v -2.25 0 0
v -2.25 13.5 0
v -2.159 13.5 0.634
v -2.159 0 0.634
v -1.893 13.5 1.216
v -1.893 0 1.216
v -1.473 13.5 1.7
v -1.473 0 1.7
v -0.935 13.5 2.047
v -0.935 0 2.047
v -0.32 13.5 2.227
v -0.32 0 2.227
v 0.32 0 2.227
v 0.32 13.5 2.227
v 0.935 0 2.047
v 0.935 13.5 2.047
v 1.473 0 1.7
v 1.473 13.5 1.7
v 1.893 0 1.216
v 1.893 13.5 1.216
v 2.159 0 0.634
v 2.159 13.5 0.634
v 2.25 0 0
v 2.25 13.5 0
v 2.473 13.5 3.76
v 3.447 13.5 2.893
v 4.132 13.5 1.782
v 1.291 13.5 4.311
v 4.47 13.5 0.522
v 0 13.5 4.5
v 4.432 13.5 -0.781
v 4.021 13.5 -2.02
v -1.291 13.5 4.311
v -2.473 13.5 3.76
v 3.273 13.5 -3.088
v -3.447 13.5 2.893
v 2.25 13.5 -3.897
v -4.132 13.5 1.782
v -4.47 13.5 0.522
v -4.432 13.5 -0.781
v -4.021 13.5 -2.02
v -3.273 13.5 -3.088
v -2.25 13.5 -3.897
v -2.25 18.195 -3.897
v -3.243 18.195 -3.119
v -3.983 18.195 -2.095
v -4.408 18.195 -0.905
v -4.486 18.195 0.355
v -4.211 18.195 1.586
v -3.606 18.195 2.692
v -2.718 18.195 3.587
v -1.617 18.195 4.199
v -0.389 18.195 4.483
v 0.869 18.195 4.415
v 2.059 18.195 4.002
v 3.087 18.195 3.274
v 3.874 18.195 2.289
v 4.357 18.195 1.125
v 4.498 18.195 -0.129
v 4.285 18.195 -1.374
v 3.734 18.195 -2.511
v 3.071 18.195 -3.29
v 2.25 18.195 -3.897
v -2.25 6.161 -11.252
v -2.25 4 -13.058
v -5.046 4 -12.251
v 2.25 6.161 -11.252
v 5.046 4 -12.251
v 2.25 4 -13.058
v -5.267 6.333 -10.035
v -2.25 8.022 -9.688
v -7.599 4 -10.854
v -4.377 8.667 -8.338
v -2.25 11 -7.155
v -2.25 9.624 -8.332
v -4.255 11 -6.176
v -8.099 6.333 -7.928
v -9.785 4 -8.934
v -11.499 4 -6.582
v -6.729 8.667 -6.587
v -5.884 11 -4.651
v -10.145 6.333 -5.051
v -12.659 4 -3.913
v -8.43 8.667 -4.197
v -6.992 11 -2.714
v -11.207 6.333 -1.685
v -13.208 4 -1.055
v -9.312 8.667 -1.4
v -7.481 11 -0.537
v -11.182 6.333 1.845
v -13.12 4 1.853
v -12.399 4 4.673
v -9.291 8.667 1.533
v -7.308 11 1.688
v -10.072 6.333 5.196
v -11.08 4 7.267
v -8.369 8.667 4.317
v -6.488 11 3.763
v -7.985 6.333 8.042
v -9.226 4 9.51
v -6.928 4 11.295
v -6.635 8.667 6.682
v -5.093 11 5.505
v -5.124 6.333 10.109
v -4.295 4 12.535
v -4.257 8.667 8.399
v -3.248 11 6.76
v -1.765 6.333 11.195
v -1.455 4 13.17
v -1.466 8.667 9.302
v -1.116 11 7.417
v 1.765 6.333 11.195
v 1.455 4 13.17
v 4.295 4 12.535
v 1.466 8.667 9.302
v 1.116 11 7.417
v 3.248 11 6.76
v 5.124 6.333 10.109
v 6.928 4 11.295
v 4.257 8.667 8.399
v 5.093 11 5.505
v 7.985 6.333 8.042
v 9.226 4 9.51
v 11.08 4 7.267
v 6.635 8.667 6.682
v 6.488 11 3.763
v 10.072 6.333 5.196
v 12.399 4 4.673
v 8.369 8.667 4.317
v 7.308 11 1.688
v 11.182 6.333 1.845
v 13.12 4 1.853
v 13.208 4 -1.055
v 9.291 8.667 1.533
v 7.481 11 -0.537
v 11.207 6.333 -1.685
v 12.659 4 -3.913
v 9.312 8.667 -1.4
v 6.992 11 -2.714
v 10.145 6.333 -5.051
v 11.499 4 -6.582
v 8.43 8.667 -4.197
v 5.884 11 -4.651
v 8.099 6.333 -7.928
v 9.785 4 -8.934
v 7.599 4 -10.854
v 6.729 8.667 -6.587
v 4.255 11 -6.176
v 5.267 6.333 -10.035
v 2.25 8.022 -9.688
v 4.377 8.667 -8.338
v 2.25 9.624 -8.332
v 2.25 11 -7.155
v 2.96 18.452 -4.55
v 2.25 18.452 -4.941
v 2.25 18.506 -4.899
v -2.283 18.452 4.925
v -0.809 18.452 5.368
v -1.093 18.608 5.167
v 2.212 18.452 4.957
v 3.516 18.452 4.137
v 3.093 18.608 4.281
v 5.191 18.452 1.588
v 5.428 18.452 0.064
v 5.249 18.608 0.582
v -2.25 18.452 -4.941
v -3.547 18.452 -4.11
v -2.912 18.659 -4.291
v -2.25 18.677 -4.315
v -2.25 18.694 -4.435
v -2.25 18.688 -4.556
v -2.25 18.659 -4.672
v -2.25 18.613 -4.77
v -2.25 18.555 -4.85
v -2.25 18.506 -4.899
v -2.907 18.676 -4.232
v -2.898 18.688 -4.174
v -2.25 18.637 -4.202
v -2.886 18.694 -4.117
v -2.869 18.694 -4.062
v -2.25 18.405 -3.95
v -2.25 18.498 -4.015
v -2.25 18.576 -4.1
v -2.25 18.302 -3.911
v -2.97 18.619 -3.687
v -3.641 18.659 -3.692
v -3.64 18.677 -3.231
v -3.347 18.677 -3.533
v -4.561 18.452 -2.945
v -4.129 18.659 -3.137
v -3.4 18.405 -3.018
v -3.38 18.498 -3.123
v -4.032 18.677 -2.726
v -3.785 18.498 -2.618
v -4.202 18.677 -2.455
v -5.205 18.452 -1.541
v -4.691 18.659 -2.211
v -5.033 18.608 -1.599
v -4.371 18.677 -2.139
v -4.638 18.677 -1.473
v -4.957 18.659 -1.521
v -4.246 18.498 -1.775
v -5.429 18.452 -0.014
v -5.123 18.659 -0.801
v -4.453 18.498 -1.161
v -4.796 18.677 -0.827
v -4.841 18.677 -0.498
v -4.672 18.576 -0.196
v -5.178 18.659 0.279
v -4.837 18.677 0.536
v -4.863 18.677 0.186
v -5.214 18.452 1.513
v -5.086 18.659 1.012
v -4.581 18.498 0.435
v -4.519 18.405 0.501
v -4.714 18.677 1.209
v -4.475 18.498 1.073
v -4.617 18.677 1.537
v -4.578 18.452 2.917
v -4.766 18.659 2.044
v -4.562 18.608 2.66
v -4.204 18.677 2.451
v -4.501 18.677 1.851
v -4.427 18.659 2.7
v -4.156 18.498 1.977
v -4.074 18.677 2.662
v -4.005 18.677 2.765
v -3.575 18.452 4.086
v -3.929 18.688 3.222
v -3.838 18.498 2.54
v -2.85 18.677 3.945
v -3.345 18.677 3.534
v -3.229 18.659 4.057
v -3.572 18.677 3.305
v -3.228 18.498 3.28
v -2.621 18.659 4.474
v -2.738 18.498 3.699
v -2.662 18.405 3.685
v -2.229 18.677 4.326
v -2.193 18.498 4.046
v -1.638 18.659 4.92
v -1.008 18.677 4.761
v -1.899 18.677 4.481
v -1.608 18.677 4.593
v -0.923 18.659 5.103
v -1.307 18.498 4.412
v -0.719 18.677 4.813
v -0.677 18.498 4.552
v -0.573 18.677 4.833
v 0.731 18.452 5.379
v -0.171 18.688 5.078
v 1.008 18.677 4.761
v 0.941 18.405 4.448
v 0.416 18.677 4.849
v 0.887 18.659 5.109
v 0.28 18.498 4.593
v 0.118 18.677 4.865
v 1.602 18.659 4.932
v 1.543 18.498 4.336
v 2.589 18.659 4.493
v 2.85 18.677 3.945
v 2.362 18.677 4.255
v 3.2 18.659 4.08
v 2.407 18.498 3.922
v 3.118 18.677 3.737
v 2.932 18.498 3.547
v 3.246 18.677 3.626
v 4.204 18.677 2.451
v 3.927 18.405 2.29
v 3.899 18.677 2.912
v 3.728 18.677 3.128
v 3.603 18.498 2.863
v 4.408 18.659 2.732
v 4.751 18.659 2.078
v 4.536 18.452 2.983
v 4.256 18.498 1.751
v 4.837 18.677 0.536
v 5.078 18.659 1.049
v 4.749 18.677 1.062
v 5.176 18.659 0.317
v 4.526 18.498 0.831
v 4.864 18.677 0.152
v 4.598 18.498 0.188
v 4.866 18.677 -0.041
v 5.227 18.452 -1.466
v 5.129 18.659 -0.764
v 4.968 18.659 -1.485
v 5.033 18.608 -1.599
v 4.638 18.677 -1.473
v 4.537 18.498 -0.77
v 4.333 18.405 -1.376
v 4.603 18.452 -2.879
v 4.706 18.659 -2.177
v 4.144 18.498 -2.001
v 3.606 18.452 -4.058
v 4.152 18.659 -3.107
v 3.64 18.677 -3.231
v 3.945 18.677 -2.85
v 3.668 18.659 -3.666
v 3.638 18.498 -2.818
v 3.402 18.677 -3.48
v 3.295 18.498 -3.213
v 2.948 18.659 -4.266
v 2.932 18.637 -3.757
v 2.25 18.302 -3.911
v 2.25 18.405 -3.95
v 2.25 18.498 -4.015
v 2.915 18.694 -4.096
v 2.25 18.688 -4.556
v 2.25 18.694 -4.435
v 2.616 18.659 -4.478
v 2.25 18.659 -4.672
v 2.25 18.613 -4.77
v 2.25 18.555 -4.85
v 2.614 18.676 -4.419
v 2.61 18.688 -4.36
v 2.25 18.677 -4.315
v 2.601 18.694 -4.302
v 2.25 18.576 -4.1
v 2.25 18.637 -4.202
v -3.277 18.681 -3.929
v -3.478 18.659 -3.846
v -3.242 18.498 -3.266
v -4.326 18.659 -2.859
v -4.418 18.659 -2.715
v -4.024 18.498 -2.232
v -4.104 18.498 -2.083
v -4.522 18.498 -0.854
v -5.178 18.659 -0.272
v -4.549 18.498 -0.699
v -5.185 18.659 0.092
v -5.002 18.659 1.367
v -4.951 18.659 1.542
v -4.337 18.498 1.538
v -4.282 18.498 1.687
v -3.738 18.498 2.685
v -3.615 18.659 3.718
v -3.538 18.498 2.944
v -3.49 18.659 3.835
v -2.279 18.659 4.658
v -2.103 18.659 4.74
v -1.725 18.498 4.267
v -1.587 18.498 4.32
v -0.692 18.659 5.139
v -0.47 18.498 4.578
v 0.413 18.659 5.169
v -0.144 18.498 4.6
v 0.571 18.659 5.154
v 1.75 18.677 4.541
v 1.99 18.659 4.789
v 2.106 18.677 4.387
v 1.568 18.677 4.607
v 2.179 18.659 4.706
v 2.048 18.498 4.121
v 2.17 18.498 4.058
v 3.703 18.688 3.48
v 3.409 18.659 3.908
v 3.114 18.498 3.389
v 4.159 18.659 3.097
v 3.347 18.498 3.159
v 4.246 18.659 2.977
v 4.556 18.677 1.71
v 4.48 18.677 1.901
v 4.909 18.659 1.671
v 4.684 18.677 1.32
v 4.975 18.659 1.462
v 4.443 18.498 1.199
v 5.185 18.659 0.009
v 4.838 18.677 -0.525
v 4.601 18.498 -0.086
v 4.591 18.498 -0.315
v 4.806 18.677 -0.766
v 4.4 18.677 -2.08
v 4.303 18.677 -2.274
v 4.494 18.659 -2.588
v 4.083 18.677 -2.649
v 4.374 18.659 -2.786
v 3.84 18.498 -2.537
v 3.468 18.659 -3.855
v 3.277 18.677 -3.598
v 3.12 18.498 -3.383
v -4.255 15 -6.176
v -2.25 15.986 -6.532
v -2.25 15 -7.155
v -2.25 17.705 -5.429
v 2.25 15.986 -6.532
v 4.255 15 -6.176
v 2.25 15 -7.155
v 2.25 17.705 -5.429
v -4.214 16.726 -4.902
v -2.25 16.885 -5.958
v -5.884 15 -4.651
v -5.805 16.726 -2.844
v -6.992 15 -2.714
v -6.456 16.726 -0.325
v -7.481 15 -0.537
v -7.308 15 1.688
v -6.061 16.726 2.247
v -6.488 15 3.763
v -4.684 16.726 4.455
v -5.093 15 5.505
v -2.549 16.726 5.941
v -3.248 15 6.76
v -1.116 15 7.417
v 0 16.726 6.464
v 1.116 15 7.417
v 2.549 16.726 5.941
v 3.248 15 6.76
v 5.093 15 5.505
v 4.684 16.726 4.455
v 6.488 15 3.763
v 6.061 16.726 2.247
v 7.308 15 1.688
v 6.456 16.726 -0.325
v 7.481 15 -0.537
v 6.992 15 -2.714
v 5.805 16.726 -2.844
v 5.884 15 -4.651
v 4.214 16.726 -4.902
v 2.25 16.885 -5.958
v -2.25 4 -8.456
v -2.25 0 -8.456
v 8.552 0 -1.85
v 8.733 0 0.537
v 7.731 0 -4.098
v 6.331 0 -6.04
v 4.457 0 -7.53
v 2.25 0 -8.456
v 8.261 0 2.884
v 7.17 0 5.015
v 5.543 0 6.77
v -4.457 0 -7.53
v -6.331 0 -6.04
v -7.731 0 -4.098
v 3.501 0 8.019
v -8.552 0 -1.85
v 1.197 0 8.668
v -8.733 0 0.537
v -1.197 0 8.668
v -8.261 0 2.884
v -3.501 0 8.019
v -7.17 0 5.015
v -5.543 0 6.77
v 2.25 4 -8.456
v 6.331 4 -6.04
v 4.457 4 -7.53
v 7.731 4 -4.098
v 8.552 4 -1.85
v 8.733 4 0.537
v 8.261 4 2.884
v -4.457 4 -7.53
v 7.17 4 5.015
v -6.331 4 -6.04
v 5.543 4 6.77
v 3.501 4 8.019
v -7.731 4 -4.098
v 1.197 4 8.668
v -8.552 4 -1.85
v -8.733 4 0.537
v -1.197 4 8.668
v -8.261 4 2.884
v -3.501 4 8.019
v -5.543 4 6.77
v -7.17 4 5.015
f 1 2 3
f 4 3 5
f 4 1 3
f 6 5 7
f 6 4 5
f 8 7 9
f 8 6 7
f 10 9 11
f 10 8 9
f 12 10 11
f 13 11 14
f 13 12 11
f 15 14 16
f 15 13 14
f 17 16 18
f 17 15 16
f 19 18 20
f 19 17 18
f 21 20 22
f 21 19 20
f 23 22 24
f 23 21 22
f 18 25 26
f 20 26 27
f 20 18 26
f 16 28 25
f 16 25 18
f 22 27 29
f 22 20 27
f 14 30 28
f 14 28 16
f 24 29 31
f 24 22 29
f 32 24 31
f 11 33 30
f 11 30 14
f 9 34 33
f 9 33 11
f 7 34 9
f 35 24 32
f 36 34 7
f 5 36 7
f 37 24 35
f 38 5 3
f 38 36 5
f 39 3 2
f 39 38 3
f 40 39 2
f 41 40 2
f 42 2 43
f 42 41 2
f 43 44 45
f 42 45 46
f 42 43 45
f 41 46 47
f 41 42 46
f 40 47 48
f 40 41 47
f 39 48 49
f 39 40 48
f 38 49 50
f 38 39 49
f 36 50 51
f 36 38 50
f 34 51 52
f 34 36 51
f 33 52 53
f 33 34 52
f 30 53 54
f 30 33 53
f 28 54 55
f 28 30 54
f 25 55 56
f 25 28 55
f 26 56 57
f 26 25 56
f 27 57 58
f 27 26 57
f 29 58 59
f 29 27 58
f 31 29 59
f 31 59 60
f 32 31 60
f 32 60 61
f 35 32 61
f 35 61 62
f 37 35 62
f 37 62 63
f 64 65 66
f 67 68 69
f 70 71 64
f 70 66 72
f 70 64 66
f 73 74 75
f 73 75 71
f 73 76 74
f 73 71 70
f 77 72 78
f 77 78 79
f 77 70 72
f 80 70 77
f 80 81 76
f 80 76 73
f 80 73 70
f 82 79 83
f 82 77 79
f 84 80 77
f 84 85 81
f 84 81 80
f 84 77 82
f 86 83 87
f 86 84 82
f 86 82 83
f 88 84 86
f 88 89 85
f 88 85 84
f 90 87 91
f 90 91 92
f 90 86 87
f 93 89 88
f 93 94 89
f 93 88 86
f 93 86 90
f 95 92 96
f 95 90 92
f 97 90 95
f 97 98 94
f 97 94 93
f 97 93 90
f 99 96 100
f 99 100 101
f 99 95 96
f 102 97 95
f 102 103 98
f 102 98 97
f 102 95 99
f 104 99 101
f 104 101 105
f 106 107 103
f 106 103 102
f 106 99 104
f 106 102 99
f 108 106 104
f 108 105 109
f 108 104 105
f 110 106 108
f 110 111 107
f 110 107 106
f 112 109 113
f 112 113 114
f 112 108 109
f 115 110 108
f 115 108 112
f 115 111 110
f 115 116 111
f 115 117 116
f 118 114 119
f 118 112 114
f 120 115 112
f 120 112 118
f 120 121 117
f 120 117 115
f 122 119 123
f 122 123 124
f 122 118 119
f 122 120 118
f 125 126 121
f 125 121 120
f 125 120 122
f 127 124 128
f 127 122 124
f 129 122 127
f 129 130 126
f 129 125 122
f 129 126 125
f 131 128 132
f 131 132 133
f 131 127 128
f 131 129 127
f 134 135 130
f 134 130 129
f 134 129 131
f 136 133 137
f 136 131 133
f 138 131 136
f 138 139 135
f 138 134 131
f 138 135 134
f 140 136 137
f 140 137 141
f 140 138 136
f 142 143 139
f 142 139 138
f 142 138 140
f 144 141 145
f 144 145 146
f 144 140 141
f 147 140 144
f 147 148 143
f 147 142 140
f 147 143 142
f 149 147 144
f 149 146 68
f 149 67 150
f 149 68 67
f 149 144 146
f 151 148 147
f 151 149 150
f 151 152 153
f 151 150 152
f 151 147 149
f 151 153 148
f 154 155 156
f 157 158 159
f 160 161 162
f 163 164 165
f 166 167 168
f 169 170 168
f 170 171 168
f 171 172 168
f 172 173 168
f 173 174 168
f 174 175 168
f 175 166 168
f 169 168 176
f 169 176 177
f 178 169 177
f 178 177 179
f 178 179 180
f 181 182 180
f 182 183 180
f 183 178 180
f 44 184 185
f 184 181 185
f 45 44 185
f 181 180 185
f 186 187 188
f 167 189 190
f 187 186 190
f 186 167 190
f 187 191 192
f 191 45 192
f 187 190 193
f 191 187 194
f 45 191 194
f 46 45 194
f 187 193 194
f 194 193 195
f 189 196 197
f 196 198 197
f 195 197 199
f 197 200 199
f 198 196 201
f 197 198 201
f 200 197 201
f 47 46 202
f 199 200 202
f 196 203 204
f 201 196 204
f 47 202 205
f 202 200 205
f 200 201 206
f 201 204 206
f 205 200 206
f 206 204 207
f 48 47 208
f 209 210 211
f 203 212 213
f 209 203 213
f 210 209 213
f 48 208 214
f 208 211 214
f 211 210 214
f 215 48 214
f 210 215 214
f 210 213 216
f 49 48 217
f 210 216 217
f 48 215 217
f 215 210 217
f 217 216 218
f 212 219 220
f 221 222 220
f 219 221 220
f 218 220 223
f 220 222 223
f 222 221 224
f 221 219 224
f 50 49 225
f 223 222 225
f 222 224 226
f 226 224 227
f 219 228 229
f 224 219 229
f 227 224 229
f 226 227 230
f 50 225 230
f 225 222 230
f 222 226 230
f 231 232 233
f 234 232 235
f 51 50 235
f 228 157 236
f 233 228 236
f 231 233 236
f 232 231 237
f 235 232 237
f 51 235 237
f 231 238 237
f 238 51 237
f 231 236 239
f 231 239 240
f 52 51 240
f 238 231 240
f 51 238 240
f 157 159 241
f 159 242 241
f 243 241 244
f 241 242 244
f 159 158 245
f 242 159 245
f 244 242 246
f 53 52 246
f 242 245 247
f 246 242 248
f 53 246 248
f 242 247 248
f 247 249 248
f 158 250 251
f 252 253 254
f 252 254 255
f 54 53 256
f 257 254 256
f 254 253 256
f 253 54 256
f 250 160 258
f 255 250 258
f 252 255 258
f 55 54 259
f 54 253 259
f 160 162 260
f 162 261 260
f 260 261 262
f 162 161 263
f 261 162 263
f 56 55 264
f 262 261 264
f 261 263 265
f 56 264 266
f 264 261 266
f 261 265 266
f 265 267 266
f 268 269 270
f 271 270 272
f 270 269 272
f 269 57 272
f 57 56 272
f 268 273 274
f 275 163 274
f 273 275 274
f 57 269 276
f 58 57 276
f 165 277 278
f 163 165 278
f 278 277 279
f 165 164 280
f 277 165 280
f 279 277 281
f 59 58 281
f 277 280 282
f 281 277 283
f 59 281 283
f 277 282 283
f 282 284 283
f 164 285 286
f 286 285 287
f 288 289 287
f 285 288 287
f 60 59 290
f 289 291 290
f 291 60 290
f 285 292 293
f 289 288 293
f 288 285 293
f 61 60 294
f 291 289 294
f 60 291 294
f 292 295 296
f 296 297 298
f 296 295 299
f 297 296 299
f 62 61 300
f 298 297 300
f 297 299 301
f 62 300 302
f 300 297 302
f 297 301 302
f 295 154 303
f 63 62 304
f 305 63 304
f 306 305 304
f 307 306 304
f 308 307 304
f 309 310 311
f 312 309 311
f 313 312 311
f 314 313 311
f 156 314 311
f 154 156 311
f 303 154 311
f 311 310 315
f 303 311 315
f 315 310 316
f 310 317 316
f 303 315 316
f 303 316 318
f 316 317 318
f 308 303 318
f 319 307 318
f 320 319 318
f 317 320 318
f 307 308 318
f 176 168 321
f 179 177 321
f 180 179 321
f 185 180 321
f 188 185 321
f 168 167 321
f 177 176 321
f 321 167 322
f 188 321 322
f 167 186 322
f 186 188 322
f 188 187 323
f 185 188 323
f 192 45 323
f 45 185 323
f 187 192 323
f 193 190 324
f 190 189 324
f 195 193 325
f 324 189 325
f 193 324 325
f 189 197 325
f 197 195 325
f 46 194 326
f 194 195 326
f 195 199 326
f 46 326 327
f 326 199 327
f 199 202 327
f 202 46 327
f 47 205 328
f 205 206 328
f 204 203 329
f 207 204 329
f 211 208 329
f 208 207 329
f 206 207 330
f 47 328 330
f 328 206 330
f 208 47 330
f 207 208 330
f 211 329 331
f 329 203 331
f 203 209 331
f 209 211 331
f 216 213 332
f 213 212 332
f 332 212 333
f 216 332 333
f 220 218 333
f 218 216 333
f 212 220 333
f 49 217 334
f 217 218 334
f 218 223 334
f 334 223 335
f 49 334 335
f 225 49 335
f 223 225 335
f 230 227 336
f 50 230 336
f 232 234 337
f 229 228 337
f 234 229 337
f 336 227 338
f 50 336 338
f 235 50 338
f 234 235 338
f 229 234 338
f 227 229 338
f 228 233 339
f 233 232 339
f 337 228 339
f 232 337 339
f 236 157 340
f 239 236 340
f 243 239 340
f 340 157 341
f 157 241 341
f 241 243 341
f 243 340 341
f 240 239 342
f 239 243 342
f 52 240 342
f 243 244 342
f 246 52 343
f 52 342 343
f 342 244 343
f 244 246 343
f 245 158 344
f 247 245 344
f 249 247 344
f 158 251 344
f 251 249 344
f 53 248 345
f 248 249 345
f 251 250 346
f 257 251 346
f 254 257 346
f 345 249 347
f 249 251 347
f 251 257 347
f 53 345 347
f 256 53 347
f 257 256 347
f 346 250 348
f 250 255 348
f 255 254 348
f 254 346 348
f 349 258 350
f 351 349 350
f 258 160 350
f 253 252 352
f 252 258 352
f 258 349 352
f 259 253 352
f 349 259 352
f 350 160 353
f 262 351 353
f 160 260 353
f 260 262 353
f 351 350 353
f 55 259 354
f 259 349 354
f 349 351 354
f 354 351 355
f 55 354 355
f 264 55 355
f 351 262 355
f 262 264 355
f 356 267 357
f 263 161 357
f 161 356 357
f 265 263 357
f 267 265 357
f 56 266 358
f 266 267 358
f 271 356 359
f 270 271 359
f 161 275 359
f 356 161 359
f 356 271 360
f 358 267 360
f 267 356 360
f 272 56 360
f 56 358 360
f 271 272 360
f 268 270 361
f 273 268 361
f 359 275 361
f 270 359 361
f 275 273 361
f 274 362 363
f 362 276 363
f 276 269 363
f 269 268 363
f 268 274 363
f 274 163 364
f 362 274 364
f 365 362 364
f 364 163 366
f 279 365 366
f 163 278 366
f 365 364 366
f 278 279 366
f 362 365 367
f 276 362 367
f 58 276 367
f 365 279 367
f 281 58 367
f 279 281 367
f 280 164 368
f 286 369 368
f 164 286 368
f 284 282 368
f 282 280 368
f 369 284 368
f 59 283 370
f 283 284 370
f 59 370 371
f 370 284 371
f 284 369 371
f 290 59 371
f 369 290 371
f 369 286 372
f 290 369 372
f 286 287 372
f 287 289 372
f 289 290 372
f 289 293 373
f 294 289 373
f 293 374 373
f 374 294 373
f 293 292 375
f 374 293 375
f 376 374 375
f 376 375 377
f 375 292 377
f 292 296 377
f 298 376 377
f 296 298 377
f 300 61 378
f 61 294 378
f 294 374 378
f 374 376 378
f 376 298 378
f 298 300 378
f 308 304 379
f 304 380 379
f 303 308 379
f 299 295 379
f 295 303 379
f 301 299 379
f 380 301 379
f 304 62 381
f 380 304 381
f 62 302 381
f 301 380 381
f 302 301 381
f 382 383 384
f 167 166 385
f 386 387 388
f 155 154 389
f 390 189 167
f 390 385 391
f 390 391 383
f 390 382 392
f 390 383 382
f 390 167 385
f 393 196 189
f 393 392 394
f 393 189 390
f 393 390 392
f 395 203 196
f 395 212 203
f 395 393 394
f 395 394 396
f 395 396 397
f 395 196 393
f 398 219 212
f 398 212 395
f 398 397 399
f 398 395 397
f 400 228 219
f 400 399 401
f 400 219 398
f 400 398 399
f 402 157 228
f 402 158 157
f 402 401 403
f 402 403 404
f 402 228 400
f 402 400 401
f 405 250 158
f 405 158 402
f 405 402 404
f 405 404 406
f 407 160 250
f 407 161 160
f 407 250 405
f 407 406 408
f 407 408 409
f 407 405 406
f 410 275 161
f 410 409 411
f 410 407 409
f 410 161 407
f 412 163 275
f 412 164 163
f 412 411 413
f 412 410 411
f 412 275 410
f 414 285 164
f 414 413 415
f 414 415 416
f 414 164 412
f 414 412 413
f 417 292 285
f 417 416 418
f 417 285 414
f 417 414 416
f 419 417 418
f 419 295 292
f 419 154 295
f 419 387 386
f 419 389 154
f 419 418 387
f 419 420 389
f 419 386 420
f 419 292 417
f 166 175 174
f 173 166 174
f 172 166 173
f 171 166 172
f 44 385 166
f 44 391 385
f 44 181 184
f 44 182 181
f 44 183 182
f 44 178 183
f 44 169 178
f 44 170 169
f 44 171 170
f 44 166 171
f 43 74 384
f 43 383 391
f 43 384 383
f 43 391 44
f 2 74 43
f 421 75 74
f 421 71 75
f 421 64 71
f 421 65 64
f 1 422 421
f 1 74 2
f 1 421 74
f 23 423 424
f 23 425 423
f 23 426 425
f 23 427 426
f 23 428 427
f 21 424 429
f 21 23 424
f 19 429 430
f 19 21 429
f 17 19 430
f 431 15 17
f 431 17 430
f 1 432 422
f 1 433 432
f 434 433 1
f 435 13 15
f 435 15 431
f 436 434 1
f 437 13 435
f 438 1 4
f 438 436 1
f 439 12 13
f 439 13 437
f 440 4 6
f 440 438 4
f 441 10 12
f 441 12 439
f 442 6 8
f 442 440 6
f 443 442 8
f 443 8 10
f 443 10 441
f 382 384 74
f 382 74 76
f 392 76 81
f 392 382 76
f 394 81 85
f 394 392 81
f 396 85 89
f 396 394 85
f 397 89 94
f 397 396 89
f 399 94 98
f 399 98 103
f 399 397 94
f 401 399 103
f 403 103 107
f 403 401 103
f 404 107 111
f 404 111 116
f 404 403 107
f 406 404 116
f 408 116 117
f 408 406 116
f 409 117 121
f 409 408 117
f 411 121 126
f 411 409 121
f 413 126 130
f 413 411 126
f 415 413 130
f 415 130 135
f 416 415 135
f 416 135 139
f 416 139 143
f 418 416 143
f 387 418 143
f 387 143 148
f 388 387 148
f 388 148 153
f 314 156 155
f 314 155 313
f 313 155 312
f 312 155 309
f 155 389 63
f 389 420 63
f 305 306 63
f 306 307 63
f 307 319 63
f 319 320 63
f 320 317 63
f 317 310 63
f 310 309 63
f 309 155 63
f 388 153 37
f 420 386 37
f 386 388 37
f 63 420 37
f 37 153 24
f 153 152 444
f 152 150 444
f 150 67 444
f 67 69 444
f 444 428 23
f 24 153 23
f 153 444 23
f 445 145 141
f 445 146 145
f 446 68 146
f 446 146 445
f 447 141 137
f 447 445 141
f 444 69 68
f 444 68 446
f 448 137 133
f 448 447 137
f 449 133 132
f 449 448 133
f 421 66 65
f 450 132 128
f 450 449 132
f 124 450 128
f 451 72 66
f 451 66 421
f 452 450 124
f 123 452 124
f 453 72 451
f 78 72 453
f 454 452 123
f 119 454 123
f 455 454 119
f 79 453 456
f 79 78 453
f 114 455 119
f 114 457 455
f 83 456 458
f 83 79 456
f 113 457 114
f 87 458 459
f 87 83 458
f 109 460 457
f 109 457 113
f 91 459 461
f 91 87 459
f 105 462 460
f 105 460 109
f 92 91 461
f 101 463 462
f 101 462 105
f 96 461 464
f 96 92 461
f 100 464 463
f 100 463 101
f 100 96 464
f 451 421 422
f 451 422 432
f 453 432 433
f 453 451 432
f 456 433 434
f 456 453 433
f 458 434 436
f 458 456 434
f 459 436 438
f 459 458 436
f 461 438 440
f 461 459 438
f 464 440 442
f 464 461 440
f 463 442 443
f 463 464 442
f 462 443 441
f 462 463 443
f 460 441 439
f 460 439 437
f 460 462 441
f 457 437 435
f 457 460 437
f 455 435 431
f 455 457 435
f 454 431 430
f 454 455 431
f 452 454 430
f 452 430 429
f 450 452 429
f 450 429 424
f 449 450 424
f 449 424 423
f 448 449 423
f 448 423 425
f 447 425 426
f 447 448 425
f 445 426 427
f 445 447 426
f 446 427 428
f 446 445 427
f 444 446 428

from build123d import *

# Parameters (mm, degrees)
FILLET1_R          = 0.5
SKETCH3_W          = 4.5
SKETCH3_H          = 28.736220623
CUT_EXTRUDE1_DEPTH = 28


with BuildPart() as part:
    # Sketch2 → Revolve1 (revolve)
    with BuildSketch(Plane.XY, mode=Mode.PRIVATE) as revolve1_sk:
        Polygon((-2.25, 13.5), (-2.25, 0), (-8.75, 0), (-8.75, 4), (-13.25, 4), (-7.5, 11), (-7.5, 15), (-4.5, 20), (-4.5, 13.5), align=None)
    revolve(revolve1_sk.sketch.rotate(Axis((0, 0, 0), (0, 1, 0)), 270), axis=Axis((0, 0, 0), (0, 1, 0)))

    # Fillet1
    fillet1_edges = [part.edges().sort_by_distance(p)[0] for p in [
        (0, 20, 4.5),
    ]]
    fillet(fillet1_edges, radius=FILLET1_R)

    # Sketch3 → Cut-Extrude1 (cut)
    with BuildSketch(Plane.XZ):
        with Locations((0, -14.368110312)):
            Rectangle(SKETCH3_W, SKETCH3_H)
    extrude(amount=-CUT_EXTRUDE1_DEPTH, mode=Mode.SUBTRACT)


solid = part.part
